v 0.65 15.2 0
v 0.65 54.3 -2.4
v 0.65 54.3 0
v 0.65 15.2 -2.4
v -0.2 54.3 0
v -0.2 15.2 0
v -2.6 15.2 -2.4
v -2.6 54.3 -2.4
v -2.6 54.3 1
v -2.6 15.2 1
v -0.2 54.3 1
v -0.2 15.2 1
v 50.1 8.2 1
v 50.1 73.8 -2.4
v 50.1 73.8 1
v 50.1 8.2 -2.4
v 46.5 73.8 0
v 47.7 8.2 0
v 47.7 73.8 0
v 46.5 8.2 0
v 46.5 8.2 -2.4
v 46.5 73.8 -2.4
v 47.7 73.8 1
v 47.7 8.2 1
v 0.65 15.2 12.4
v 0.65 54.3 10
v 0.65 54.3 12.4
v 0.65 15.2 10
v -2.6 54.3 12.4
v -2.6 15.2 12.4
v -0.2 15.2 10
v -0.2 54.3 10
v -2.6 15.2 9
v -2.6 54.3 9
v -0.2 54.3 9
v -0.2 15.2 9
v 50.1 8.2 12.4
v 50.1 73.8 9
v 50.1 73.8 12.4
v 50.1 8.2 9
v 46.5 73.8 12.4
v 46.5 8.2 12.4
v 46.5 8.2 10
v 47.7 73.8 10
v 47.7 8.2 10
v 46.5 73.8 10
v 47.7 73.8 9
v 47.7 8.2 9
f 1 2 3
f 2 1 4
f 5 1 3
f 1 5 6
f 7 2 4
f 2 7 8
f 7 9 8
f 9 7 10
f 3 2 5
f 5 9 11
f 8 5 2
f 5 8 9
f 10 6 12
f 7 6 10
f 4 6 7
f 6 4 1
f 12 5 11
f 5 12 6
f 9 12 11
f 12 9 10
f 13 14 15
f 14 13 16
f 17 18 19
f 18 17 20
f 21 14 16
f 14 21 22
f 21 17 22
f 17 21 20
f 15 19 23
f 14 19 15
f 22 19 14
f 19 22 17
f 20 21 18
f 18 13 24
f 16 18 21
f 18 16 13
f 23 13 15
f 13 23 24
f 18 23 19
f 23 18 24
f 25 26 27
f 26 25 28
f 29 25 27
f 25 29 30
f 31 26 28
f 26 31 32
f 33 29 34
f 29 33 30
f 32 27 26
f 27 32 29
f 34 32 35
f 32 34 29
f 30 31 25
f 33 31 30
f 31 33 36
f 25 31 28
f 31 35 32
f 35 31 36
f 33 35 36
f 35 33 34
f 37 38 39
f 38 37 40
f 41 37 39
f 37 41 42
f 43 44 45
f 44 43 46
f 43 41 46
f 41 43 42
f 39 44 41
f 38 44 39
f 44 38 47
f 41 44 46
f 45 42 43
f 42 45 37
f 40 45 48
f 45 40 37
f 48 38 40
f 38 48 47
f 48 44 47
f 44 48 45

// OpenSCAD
// SPLIT-RAIL INTERFACE STUDY, NOT A COMPLETE PRINTABLE ENCLOSURE.
// Coordinates match native PCB front view; local Z=0 is the lower ledge surface.
// Factory module heights, lid depth, jack stop and case attachments are UNKNOWN.
// Only the fit-coupon STL files are intended as printing trials.
board_width = 47.5;
board_height = 75.0;
// Inset from CAD maximum bands by the trial displacement budget.
// A measured case must bound movement of EVERY edge point, including rotation.
contact_bands = [[0, 15.2, 0.6499999999999999, 54.3], [46.5, 8.2, 47.5, 73.8]];
h3 = [18.0, 52.03];
pcb_preview_thickness = 1.6; // NOMINAL, not measured
slot_height = 2.0; // TRIAL ONLY: select after coupons
side_clearance = 0.2; // per edge, trial only
wall = 2.4;
lip = 2.4;
lid_lift = 8.0; // 0 for a closed interface preview
show_pcb = true;
mode = "exploded"; // "lower", "upper", "closed", "exploded"
assert(slot_height > pcb_preview_thickness);
module lower_rail(b, right=false) {
  x0 = right ? b[0] : -side_clearance-wall;
  x1 = right ? board_width+side_clearance+wall : b[2];
  wx = right ? board_width+side_clearance : -side_clearance-wall;
  union() {
    translate([x0,b[1],-lip]) cube([x1-x0,b[3]-b[1],lip]);
    translate([wx,b[1],-lip]) cube([wall,b[3]-b[1],lip+slot_height/2]);
  }
}
module upper_rail(b, right=false) {
  x0 = right ? b[0] : -side_clearance-wall;
  x1 = right ? board_width+side_clearance+wall : b[2];
  wx = right ? board_width+side_clearance : -side_clearance-wall;
  union() {
    translate([x0,b[1],slot_height]) cube([x1-x0,b[3]-b[1],lip]);
    translate([wx,b[1],slot_height/2]) cube([wall,b[3]-b[1],lip+slot_height/2]);
  }
}
module lower_interfaces() {for(i=[0:1]) lower_rail(contact_bands[i],i==1);}
module upper_interfaces() {for(i=[0:1]) upper_rail(contact_bands[i],i==1);}
// These separate rail volumes must be integrated into measured case halves.
// The renderer deliberately does not bridge antenna zones or invent screw bosses.
if(mode=="lower") color("Teal") lower_interfaces();
if(mode=="upper") color("SkyBlue") upper_interfaces();
if(mode=="closed" || mode=="exploded") {
  color("Teal") lower_interfaces();
  translate([0,0,mode=="exploded" ? lid_lift : 0]) color("SkyBlue") upper_interfaces();
  if(show_pcb) %difference() {
    cube([board_width,board_height,pcb_preview_thickness]);
    translate([h3[0],h3[1],-1]) cylinder(d=2.7,h=pcb_preview_thickness+2,$fn=48);
  }
}
